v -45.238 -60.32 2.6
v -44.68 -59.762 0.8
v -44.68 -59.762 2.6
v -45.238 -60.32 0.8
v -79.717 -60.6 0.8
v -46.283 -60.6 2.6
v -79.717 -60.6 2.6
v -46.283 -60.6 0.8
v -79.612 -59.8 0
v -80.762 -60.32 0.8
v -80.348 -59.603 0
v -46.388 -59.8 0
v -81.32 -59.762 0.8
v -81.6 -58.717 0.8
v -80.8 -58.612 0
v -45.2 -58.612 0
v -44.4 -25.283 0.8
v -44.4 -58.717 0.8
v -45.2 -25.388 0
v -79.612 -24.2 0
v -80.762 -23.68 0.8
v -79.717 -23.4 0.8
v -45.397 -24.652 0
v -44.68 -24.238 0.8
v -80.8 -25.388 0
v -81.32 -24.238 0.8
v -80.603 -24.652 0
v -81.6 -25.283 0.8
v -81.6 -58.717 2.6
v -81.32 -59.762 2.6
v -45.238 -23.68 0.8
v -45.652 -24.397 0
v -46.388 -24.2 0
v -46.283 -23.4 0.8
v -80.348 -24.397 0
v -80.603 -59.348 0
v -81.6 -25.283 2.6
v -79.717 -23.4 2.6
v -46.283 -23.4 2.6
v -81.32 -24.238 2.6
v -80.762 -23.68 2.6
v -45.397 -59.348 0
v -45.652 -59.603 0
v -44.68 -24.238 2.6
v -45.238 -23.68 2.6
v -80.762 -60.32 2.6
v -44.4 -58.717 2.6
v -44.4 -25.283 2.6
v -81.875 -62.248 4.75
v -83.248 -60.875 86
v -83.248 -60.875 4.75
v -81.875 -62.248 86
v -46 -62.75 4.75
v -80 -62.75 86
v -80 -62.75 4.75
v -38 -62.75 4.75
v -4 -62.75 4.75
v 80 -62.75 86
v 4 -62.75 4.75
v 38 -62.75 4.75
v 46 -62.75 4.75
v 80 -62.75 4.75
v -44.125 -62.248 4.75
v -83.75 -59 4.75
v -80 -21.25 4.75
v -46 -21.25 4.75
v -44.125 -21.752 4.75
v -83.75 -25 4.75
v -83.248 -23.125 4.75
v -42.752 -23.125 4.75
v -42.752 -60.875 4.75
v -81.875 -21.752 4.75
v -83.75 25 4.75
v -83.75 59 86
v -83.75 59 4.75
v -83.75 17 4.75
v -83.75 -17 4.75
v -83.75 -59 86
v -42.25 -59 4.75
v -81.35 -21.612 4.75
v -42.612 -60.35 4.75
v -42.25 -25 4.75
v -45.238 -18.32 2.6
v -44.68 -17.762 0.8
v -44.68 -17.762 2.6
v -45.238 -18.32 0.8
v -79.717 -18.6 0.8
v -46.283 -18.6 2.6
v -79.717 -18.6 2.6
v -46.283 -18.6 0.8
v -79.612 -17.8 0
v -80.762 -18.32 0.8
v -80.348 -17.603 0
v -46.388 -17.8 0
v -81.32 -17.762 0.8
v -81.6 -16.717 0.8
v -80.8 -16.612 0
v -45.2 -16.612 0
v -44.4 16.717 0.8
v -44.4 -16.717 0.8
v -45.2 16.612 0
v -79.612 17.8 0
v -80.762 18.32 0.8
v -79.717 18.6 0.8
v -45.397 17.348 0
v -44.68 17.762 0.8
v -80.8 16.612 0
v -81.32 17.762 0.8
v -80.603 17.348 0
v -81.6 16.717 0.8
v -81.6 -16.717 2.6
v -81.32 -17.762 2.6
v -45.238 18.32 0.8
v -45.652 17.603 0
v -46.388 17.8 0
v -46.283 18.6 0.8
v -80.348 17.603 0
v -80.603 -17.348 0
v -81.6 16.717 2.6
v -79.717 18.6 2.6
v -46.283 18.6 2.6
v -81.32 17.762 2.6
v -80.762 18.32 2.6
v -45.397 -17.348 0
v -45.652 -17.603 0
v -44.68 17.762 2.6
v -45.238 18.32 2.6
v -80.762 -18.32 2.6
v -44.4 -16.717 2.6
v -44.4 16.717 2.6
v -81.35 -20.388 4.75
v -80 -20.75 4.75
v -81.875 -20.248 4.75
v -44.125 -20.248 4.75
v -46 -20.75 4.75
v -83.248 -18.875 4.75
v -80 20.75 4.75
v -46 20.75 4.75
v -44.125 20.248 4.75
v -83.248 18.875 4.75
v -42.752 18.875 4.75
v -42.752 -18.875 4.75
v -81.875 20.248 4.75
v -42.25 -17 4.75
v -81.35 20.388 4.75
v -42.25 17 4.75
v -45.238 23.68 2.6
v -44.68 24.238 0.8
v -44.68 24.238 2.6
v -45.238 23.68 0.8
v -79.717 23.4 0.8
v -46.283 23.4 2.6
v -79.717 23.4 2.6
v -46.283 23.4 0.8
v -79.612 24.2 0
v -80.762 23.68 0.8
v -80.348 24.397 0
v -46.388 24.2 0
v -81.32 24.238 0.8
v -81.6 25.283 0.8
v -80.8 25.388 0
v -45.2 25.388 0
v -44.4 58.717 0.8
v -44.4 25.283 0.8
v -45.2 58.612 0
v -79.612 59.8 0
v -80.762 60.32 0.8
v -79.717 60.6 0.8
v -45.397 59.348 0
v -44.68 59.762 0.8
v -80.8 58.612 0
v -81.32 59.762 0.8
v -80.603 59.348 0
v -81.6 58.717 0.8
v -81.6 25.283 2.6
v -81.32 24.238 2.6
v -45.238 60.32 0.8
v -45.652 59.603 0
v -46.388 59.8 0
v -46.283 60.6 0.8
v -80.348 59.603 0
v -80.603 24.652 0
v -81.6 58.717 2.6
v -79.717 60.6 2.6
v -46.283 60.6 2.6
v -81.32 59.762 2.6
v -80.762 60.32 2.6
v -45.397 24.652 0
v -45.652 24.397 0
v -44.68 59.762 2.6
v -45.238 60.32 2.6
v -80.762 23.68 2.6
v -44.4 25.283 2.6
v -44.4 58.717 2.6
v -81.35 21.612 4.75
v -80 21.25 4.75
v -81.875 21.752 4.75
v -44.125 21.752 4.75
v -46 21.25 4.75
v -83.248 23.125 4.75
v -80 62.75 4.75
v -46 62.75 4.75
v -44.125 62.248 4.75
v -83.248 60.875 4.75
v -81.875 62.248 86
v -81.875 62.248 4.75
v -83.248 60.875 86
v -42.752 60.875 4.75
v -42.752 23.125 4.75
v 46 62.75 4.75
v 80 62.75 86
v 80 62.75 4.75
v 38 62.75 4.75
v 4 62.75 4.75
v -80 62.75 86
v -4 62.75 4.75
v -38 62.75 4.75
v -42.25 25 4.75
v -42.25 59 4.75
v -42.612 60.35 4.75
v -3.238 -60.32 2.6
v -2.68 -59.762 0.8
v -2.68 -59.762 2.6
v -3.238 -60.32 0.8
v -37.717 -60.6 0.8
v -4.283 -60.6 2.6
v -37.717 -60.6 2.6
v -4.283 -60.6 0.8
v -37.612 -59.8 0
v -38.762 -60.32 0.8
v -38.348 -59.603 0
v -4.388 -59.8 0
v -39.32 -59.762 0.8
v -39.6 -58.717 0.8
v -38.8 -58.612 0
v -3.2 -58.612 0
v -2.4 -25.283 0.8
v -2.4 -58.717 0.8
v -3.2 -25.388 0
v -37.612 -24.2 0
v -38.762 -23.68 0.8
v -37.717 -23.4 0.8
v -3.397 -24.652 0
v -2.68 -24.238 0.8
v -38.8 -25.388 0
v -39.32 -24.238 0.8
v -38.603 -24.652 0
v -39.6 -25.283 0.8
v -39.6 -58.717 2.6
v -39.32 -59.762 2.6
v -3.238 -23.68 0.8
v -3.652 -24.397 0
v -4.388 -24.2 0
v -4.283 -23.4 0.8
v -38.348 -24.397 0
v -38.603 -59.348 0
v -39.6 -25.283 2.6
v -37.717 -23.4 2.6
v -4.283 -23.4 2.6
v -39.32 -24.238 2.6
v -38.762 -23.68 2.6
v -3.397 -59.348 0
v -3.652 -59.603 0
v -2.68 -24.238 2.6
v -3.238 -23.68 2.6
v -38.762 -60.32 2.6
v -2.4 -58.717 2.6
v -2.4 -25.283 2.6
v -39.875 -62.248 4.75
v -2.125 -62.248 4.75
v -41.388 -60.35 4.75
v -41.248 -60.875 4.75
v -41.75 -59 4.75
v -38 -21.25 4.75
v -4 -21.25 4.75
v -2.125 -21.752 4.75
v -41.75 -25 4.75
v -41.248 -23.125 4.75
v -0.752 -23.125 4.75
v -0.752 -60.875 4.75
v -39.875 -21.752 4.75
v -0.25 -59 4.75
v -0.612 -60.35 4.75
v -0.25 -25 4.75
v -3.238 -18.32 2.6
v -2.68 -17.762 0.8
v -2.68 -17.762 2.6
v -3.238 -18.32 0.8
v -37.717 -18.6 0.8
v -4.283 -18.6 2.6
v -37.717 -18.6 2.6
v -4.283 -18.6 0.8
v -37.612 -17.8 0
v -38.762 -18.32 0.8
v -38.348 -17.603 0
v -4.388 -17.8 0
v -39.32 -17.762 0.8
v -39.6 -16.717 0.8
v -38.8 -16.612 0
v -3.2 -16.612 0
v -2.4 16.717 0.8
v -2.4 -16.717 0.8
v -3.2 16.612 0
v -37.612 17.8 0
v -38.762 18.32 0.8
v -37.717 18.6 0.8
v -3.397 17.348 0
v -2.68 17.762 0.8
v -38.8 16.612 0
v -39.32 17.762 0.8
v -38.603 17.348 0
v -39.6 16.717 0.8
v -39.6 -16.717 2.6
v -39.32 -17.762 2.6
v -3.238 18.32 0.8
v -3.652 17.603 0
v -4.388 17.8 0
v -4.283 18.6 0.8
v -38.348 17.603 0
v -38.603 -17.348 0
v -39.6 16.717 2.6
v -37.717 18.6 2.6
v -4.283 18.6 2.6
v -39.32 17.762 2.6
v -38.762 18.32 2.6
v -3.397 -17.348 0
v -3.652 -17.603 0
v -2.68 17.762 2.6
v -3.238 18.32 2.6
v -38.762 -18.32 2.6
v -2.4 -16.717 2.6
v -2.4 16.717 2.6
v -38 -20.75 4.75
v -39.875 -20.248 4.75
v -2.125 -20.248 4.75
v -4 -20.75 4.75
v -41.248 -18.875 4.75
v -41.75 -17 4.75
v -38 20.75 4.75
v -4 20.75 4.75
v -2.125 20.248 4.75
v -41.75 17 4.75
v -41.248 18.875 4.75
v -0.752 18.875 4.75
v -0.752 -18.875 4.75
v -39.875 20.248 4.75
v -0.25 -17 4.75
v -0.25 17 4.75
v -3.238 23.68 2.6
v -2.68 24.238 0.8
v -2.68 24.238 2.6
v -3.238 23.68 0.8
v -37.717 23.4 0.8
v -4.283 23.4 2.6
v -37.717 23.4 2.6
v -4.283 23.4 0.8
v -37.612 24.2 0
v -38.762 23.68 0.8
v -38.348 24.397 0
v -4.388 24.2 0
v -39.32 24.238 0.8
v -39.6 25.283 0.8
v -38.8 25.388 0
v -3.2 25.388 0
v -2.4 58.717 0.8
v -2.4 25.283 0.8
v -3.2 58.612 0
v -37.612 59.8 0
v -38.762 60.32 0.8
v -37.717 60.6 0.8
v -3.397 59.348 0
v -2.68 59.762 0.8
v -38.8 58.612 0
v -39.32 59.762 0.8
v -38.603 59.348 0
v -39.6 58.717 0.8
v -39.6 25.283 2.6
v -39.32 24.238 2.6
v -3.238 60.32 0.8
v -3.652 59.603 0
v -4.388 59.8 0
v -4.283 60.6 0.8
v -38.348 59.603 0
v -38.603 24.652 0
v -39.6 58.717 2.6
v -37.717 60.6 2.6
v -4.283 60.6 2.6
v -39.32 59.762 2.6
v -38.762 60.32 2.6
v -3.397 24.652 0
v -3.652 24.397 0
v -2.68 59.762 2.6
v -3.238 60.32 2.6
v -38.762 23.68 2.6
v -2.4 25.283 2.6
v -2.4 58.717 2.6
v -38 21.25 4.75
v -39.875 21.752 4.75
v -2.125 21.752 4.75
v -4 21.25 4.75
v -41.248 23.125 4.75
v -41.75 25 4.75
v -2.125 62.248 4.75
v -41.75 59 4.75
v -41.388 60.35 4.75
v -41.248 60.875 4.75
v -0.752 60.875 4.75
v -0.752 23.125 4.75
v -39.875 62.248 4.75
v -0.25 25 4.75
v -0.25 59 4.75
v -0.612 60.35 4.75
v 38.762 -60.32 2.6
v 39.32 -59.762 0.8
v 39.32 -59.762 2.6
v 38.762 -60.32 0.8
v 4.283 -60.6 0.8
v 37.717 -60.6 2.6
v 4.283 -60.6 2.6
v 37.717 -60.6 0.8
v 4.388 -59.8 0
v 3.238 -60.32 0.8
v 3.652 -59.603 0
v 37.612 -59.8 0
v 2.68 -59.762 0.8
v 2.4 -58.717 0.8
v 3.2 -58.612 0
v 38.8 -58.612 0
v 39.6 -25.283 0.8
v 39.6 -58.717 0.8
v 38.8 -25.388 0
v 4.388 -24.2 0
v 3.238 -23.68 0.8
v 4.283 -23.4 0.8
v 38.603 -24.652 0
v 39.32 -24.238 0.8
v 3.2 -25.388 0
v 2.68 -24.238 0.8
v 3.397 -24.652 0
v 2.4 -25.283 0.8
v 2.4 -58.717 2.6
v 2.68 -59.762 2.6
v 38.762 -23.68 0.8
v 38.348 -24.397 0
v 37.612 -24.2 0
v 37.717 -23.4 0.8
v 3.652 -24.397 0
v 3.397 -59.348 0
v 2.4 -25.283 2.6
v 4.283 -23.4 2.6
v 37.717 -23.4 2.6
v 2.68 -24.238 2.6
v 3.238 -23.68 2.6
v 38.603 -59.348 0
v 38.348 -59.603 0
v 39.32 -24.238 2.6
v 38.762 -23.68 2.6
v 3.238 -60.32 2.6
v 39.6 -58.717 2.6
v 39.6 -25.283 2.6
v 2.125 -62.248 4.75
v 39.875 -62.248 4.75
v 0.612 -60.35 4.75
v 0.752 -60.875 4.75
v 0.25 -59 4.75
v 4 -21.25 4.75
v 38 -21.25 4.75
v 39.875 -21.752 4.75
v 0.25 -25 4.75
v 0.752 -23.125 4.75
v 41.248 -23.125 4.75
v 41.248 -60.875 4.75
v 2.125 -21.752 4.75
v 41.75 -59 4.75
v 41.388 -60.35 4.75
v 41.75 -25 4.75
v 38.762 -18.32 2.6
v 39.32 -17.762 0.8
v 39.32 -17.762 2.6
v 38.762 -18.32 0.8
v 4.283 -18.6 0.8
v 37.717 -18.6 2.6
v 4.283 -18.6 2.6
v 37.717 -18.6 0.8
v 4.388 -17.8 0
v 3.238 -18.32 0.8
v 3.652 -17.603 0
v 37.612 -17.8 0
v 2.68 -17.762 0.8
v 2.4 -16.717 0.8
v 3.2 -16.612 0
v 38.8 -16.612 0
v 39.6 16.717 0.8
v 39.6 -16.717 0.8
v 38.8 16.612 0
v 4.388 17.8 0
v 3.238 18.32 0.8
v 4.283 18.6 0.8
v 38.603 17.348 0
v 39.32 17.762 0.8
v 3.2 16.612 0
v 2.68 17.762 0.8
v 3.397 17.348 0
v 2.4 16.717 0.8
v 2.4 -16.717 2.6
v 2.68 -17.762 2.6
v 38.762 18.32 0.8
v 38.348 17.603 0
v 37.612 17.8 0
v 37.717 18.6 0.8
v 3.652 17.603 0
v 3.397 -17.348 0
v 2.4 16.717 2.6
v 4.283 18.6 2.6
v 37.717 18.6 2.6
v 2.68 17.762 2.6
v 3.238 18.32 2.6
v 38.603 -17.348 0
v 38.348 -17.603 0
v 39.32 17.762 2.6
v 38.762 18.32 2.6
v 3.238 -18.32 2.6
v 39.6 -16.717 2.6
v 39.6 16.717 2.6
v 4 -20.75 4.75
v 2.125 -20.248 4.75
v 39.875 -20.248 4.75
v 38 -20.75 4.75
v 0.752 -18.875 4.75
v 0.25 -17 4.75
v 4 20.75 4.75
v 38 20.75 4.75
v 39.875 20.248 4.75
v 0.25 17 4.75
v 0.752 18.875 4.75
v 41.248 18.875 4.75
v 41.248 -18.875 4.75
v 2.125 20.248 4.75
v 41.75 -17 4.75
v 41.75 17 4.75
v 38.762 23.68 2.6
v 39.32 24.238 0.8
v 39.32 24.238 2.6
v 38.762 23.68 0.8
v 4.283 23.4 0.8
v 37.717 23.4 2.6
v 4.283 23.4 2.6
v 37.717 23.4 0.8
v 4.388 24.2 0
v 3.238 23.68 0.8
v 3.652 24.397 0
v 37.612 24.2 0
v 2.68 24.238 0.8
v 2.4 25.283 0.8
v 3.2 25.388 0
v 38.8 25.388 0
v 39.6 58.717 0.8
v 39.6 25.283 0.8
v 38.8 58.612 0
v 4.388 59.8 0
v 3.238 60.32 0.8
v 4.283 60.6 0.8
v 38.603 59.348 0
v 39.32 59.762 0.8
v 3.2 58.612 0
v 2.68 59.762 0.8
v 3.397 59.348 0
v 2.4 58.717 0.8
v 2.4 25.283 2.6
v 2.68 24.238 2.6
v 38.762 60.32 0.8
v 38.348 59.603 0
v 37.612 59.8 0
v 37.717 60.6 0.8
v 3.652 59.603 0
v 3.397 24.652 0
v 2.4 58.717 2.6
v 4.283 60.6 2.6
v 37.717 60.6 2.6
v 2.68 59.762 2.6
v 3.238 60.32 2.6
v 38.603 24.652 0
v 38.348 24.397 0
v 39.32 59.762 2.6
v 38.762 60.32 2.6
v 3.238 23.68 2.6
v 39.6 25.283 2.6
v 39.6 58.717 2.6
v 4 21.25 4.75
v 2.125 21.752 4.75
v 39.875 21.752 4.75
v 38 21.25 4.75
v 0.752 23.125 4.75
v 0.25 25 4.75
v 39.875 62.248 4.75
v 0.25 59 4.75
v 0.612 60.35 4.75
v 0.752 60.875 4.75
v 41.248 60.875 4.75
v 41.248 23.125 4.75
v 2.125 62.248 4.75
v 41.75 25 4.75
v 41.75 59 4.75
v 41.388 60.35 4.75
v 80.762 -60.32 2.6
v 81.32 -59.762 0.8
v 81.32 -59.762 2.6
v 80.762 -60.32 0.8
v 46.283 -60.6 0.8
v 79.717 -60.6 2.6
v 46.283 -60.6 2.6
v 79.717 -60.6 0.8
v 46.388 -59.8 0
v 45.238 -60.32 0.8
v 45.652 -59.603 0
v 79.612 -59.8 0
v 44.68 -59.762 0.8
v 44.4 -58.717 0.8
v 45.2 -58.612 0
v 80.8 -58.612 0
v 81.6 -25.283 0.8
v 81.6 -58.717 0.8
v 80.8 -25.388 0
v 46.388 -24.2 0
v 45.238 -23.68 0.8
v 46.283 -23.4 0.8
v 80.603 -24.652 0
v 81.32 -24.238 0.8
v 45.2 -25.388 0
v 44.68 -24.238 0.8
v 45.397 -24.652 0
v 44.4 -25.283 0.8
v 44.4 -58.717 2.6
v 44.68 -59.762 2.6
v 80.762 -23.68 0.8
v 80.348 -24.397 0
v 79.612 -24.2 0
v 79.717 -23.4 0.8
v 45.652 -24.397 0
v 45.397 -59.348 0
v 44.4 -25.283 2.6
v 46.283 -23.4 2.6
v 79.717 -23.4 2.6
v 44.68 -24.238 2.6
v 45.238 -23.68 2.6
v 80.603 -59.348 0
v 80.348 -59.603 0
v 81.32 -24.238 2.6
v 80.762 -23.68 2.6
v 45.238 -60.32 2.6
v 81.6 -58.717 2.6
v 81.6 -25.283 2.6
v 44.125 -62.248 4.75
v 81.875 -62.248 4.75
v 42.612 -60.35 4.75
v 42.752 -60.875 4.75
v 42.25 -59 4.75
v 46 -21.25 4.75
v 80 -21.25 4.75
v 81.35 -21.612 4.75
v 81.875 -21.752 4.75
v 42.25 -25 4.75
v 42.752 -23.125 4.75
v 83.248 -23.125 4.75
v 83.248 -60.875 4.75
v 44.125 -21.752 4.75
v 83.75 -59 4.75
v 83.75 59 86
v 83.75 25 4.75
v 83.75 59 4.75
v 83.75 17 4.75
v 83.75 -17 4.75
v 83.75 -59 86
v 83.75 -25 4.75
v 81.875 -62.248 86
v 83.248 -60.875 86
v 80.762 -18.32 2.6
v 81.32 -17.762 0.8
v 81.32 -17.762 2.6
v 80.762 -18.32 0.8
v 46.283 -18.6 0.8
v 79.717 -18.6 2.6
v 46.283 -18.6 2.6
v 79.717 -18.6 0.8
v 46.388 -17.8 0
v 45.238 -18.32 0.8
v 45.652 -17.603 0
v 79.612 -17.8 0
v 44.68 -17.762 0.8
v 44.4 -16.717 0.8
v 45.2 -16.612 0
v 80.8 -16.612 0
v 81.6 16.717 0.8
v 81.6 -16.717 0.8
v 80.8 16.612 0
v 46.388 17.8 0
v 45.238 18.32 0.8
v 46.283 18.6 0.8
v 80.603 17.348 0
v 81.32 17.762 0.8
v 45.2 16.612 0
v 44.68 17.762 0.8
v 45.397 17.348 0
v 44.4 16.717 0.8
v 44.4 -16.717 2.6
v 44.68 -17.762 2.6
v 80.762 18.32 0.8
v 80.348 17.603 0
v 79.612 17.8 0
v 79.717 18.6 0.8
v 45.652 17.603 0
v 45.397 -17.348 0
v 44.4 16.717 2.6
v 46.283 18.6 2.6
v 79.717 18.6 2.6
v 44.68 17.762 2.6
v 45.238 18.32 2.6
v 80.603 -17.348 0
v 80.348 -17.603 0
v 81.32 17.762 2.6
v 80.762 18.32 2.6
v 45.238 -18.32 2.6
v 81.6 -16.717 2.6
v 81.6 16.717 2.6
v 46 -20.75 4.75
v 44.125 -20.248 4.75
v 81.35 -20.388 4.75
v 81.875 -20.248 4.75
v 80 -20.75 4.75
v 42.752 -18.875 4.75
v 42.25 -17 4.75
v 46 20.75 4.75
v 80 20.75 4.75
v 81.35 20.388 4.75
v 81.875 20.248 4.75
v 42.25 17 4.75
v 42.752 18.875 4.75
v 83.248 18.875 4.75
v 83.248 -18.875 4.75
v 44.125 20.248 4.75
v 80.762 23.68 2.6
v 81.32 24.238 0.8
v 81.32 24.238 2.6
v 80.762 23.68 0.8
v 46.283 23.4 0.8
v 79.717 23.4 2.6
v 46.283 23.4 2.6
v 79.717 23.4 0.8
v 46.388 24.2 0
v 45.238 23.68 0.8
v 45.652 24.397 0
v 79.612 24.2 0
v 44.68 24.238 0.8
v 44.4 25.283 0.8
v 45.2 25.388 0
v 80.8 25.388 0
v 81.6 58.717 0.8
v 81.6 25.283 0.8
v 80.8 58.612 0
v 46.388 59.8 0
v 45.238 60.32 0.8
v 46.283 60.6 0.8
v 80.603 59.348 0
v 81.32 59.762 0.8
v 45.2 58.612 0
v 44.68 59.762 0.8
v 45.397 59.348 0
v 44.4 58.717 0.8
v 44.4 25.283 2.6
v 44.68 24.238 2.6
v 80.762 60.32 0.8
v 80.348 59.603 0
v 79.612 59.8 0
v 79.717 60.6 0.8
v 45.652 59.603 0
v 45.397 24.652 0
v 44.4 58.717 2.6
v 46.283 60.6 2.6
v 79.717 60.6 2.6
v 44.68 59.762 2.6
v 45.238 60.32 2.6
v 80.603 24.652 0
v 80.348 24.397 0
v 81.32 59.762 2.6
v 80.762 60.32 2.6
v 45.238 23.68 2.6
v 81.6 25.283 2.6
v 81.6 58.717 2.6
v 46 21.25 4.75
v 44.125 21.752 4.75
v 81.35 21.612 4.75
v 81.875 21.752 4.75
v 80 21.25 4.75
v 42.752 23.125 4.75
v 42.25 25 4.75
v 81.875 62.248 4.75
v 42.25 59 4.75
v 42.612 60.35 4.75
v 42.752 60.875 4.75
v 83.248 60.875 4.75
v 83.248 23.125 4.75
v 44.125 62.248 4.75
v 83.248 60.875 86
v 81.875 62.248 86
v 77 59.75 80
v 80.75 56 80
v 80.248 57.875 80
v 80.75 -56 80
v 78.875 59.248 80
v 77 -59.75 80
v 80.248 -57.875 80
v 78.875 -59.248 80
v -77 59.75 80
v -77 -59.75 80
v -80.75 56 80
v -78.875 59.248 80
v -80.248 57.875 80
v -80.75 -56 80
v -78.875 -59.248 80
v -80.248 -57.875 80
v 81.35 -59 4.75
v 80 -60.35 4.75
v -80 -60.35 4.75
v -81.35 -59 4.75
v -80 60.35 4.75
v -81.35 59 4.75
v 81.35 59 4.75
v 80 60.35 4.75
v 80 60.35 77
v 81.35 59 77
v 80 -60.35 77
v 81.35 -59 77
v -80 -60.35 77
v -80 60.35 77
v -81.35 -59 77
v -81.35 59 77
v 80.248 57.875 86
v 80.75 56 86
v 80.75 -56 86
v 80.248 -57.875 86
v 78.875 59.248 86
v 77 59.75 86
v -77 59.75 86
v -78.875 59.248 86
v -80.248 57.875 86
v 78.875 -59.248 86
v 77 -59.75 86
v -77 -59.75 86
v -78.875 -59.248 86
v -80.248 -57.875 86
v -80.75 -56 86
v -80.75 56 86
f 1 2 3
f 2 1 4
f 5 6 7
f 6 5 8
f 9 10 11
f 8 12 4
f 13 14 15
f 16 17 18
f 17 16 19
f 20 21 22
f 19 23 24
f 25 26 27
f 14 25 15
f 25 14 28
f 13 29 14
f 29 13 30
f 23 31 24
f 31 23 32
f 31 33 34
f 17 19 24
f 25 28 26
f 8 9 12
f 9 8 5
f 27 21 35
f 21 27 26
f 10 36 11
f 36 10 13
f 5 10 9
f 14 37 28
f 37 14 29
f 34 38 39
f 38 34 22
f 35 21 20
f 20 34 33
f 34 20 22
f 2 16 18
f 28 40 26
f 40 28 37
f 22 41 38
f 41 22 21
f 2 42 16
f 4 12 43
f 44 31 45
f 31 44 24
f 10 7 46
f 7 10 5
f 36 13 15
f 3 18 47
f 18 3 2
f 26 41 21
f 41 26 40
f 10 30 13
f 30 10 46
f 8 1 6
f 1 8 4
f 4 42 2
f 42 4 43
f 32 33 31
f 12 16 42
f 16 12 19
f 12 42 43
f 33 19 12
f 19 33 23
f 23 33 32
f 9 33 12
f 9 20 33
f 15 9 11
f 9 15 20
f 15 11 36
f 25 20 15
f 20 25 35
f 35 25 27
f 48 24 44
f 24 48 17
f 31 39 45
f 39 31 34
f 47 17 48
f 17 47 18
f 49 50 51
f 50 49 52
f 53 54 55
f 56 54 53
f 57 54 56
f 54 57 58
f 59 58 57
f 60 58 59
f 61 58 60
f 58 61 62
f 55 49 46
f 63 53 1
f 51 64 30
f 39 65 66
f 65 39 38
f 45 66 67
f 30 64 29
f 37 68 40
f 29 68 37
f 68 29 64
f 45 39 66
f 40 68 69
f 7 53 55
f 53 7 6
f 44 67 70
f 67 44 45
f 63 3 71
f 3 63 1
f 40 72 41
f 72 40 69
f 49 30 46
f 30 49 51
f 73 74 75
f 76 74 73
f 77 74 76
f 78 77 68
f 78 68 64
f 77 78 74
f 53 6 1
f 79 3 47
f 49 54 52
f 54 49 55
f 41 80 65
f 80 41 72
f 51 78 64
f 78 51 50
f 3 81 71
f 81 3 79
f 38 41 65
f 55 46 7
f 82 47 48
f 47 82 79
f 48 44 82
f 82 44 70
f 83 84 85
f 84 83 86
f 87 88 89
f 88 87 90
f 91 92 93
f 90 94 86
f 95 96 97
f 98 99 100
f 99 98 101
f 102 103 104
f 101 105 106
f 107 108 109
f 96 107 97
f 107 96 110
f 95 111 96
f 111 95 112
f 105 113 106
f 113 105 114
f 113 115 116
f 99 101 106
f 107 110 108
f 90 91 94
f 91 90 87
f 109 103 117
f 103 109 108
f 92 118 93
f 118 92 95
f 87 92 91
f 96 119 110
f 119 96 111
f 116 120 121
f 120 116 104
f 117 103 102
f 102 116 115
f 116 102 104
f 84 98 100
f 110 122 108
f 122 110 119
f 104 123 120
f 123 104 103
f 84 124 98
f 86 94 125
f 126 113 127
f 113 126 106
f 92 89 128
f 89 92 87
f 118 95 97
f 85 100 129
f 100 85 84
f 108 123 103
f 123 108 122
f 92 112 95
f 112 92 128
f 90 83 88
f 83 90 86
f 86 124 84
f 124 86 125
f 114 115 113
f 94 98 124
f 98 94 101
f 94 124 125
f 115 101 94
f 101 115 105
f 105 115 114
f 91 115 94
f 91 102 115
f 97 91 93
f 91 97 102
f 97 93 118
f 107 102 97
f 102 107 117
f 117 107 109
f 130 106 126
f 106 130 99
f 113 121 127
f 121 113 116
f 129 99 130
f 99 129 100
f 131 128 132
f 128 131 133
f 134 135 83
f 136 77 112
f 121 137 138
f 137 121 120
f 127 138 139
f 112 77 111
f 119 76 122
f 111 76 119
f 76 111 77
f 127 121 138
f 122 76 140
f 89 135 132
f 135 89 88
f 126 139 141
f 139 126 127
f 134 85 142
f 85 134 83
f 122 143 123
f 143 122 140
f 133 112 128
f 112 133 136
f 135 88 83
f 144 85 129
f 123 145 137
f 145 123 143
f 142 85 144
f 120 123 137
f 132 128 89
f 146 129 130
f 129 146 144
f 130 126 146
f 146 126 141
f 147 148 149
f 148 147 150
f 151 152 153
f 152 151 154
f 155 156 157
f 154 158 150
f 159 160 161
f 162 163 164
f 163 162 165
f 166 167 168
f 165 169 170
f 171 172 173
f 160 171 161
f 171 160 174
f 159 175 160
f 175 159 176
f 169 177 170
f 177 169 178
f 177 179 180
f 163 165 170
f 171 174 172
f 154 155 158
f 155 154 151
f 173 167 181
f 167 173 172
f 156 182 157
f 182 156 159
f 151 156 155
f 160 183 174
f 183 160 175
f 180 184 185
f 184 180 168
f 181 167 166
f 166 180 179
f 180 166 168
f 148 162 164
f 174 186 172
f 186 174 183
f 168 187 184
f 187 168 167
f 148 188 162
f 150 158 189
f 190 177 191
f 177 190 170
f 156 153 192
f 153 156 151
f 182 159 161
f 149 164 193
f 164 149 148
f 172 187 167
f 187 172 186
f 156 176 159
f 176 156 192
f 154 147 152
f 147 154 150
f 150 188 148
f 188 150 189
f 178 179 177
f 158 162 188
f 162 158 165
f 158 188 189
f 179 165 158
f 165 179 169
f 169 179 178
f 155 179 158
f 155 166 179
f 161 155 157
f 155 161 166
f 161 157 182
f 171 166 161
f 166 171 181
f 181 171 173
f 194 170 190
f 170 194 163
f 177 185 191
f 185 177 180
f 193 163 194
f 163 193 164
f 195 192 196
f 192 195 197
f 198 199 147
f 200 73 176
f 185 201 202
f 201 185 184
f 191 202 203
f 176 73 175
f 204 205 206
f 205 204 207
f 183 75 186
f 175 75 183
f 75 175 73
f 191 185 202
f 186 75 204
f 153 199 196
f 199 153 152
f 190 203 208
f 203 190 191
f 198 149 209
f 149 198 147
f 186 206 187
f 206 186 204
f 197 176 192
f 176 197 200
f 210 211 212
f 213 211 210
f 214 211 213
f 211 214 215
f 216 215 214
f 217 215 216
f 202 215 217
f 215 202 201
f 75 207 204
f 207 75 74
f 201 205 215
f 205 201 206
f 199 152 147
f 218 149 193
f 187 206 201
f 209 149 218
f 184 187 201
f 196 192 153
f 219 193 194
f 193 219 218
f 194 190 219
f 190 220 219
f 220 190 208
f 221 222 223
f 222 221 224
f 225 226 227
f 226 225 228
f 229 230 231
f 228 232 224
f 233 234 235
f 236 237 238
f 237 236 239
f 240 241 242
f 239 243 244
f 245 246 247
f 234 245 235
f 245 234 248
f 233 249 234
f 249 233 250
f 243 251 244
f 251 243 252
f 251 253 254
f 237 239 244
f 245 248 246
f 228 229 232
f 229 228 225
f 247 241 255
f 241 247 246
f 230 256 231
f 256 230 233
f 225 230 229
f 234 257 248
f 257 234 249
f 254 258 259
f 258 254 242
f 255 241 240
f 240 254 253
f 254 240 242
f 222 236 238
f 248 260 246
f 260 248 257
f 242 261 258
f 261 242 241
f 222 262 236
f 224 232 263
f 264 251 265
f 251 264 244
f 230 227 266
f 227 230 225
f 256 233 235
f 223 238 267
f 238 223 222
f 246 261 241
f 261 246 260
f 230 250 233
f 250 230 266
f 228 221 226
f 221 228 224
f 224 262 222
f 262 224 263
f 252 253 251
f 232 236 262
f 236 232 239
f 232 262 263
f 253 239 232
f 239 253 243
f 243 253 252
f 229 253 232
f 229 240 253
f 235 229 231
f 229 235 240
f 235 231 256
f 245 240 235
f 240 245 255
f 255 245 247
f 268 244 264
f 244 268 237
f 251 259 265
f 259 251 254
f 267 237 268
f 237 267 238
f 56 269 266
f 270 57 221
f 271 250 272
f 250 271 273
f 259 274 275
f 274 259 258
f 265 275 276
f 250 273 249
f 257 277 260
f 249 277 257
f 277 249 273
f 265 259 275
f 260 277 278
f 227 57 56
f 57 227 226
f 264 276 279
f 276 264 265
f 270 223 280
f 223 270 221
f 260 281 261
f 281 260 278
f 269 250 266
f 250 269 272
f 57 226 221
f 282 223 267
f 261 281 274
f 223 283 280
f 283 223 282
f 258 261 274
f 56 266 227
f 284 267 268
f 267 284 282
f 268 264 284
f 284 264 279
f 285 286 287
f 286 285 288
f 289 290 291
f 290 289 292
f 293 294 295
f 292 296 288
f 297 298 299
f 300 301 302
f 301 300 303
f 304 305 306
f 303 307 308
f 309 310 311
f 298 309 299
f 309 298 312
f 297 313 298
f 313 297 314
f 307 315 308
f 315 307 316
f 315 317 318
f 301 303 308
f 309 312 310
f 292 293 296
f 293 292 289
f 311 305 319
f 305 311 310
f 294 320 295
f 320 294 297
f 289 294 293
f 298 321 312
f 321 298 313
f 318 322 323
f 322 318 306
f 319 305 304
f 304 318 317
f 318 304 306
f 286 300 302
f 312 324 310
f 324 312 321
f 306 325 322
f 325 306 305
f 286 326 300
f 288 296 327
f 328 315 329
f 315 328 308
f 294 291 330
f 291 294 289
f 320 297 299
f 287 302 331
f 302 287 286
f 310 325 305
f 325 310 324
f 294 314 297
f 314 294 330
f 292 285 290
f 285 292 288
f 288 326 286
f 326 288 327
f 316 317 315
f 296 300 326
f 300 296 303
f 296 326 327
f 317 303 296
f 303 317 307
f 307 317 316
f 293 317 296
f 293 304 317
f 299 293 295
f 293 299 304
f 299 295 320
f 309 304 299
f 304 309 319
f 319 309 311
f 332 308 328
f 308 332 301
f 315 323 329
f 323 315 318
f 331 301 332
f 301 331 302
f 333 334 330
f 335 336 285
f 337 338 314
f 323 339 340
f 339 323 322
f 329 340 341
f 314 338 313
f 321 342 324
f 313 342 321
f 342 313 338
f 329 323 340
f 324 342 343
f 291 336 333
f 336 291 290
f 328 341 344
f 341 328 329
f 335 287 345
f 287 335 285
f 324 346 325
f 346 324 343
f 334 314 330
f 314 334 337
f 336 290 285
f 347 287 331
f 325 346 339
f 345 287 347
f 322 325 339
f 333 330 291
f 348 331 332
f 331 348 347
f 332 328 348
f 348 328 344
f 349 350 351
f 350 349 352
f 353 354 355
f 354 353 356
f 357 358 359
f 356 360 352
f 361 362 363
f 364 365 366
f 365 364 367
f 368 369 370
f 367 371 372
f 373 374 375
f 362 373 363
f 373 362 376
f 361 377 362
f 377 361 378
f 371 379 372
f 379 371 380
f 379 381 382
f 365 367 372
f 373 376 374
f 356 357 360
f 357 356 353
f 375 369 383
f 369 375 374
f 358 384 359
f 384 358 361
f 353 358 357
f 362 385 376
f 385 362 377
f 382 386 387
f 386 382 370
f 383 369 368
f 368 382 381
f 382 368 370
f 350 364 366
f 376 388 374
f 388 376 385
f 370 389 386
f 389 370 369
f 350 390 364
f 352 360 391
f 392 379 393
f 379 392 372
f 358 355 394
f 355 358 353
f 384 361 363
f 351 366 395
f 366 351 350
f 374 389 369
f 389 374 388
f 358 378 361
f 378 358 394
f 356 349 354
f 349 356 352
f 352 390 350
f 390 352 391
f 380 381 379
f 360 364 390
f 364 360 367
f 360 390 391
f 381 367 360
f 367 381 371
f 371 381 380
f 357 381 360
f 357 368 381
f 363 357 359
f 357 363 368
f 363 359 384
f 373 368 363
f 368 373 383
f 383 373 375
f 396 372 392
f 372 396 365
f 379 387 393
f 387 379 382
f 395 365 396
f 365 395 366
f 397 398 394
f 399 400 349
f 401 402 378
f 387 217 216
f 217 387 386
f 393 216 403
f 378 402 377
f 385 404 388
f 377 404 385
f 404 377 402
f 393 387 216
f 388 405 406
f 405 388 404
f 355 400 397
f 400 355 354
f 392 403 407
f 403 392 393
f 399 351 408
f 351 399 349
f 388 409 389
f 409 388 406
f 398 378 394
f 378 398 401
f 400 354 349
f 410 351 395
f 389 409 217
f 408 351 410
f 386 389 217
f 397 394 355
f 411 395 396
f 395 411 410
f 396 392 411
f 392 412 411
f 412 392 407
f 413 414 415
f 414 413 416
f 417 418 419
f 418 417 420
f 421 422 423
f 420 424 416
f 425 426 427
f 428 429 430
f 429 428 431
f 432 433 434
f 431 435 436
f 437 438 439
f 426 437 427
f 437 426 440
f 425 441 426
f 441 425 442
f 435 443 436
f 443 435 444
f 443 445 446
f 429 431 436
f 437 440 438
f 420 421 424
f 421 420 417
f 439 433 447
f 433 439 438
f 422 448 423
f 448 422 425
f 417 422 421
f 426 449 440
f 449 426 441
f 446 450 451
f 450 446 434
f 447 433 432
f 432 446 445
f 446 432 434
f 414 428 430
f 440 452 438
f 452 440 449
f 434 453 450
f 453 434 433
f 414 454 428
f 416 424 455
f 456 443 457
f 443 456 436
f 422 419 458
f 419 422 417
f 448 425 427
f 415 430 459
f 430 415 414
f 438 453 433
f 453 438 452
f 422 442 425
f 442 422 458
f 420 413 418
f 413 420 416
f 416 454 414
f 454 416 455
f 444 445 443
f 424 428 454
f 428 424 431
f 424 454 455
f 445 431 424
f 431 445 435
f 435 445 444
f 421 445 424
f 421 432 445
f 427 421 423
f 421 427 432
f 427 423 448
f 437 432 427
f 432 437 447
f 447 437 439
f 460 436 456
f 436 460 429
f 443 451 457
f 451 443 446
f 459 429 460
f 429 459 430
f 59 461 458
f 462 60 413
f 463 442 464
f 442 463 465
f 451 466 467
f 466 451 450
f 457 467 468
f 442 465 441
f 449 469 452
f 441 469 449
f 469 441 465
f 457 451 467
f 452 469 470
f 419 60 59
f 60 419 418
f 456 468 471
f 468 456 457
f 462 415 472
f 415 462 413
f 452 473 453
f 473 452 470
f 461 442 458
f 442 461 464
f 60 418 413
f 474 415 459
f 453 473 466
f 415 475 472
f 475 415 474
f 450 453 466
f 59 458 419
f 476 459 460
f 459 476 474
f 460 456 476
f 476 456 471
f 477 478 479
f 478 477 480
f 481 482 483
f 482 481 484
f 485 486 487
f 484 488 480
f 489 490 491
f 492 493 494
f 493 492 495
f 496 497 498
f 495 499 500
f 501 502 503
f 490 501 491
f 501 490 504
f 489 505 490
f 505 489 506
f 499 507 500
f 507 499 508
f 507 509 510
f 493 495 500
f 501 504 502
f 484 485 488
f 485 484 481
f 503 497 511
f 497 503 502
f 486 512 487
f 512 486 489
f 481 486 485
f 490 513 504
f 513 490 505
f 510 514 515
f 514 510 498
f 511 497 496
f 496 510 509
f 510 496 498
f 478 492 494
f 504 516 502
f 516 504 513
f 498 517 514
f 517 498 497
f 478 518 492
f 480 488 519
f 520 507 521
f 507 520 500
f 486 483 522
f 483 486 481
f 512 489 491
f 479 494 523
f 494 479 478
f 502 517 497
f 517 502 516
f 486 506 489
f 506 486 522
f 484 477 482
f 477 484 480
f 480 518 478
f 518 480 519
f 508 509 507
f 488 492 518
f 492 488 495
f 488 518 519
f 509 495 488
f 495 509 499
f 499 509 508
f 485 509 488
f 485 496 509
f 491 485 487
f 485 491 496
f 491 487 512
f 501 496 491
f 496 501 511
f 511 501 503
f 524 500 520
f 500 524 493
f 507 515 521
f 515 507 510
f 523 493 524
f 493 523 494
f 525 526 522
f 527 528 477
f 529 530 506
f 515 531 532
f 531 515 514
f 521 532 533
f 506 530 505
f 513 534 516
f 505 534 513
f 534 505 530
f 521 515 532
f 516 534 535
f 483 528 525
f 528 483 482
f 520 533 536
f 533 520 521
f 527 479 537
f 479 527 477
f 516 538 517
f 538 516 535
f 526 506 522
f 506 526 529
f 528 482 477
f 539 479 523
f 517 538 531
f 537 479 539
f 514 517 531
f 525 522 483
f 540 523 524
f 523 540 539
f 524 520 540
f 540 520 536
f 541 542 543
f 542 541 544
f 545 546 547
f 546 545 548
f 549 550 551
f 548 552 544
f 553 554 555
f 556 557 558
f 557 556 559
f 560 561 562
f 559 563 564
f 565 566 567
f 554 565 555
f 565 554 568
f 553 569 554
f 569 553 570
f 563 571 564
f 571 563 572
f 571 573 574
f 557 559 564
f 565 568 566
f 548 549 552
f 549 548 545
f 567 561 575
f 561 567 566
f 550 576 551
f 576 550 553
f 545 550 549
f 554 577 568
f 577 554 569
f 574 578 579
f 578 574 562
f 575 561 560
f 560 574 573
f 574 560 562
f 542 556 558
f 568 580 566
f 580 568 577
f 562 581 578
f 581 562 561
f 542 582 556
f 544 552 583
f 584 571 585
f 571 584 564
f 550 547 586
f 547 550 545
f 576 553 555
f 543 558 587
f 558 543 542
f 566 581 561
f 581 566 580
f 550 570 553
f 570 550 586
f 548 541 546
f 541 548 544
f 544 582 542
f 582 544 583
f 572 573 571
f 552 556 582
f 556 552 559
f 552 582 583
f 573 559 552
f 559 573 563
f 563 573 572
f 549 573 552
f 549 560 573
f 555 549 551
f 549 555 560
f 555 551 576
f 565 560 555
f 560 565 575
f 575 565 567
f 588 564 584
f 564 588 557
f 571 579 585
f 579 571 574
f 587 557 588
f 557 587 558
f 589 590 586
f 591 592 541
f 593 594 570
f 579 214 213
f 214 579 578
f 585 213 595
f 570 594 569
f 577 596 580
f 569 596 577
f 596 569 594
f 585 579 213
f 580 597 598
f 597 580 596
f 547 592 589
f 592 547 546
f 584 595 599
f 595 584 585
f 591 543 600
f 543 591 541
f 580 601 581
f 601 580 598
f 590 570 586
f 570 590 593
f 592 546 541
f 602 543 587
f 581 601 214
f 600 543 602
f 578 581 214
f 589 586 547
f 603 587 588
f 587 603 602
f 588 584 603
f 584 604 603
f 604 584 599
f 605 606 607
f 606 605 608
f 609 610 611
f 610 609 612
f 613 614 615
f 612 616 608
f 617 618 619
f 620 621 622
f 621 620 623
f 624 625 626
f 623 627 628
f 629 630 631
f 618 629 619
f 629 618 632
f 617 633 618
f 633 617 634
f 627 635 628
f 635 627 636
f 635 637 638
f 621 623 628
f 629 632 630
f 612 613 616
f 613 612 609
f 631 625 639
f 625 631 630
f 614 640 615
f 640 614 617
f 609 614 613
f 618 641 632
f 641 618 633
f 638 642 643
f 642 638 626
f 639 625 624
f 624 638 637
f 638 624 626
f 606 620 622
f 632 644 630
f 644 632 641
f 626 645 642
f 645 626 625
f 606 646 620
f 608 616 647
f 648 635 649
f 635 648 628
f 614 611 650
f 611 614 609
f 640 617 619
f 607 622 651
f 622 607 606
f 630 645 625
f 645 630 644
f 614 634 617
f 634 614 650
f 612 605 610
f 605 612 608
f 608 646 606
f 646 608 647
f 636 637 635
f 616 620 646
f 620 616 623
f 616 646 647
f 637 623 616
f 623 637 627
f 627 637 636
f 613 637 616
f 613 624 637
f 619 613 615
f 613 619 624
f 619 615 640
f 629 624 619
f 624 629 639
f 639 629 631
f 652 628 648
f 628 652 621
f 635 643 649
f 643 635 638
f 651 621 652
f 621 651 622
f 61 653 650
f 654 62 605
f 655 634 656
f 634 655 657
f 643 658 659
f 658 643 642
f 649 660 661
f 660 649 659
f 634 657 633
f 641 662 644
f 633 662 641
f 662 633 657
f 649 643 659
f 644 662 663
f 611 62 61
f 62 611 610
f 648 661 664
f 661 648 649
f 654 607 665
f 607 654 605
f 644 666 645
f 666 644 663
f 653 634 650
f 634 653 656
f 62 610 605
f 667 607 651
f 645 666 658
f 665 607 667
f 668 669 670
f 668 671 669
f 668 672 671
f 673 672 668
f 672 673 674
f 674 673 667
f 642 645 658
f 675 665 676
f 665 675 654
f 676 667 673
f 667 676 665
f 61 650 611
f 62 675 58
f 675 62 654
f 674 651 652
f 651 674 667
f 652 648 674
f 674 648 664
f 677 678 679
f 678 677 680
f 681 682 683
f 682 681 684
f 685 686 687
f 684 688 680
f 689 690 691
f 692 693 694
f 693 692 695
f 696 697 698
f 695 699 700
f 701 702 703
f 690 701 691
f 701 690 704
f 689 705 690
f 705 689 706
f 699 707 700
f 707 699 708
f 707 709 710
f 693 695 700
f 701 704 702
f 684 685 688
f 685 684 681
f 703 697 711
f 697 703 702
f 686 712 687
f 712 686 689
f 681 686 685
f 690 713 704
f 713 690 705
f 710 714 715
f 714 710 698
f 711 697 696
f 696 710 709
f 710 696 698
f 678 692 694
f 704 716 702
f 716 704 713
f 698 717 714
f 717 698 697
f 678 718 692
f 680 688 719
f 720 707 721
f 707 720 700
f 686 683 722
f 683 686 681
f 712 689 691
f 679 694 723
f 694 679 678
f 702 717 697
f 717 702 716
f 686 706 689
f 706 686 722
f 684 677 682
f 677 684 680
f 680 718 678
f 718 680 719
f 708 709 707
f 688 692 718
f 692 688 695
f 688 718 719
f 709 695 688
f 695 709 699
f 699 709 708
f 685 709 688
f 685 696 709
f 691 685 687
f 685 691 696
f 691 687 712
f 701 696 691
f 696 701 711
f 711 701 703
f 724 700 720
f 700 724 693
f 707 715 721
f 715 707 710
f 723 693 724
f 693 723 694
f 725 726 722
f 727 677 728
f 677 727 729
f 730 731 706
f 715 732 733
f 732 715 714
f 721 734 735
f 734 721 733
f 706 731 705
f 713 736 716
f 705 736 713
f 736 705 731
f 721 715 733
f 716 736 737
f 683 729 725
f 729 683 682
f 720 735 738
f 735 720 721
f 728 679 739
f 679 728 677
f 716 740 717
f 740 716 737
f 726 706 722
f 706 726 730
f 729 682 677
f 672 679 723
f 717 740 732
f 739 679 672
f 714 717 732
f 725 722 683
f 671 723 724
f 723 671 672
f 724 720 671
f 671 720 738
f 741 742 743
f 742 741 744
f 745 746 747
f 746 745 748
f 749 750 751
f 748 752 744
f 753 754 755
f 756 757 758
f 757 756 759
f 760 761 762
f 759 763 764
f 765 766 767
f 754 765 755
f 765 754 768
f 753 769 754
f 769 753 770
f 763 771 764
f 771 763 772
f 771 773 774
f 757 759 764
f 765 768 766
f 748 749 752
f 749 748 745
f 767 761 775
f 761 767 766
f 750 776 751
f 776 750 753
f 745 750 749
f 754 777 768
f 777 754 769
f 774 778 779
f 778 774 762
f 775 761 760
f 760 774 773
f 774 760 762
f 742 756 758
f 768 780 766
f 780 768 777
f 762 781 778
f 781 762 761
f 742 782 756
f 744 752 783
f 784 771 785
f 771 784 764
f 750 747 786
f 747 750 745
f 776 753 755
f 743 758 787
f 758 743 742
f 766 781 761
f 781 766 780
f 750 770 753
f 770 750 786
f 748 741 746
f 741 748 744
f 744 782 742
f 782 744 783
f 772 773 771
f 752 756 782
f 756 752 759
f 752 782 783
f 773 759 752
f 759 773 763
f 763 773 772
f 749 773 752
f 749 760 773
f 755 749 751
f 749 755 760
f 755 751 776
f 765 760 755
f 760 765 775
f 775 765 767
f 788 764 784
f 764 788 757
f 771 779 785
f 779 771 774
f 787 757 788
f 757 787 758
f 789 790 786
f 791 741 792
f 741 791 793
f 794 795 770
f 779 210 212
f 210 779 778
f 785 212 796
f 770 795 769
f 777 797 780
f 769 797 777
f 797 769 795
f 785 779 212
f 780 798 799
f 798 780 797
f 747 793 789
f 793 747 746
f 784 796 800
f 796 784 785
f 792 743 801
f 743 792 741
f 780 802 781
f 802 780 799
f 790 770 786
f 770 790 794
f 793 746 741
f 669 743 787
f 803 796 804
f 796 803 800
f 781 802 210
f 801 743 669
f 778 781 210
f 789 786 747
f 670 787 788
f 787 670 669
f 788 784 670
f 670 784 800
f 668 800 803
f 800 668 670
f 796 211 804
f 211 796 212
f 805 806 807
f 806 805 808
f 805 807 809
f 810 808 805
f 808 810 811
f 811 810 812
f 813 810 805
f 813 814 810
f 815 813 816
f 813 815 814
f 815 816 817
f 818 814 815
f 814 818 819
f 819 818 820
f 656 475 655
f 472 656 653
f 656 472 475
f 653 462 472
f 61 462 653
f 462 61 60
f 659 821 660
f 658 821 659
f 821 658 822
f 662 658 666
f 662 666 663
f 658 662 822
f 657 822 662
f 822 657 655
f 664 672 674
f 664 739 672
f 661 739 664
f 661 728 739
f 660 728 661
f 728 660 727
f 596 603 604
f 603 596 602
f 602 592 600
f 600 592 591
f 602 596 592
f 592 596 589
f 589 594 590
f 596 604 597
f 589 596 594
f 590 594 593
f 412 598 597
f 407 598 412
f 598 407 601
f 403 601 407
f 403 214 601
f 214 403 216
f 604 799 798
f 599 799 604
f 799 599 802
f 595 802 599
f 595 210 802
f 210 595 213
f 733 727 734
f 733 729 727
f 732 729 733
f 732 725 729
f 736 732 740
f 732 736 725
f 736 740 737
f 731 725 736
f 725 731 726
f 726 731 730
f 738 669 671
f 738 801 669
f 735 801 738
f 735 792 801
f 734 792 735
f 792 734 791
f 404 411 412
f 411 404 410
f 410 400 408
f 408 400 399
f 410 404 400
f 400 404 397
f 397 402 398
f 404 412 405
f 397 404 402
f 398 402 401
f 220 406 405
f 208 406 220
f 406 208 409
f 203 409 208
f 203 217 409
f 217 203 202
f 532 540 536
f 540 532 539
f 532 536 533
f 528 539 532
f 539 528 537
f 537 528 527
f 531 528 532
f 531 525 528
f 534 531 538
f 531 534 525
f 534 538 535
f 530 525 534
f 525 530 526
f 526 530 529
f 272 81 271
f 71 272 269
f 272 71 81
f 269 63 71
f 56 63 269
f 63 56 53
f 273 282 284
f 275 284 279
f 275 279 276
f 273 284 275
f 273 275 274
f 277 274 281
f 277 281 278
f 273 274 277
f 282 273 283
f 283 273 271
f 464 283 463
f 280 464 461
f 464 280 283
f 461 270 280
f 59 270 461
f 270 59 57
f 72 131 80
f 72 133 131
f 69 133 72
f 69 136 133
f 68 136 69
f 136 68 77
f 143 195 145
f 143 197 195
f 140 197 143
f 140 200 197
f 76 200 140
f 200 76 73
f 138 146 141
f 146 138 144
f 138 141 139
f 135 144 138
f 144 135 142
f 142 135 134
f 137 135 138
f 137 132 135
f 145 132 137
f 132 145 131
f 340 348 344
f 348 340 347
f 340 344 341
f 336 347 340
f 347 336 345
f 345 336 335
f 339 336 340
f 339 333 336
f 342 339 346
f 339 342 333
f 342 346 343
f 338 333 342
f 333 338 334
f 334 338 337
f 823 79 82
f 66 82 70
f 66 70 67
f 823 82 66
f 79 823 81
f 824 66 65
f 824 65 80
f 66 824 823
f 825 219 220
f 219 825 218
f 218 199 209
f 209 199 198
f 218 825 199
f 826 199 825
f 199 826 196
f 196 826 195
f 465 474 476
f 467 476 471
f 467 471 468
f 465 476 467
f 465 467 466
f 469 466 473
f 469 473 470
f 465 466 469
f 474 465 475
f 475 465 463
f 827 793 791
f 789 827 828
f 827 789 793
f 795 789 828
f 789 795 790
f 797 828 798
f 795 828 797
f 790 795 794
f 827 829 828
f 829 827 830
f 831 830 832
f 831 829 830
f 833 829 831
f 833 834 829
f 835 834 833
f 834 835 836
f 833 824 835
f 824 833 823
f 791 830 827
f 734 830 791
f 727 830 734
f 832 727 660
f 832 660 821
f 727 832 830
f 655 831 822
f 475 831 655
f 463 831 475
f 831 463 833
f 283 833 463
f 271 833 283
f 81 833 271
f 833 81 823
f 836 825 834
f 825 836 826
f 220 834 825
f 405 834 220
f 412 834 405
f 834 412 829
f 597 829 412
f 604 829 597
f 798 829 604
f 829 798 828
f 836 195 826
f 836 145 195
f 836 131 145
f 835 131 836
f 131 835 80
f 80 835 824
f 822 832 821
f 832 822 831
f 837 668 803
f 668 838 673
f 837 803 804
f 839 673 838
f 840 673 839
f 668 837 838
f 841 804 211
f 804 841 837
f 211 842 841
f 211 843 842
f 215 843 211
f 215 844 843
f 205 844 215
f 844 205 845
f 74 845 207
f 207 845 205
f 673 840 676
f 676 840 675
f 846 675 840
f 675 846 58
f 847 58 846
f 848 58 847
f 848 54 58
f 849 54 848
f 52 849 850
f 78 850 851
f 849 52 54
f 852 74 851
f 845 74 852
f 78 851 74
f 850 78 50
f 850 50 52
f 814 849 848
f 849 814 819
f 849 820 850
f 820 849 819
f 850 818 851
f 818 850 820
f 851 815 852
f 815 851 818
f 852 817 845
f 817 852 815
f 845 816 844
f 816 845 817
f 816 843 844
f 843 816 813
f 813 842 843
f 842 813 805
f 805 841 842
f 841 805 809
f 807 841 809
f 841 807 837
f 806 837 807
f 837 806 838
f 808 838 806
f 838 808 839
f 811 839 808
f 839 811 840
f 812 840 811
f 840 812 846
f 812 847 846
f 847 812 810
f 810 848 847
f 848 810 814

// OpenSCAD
// file: ../lib/gridfinity.scad
// SPDX-License-Identifier: MIT
// Copyright (c) 2026 Aaron Cupp
//
// gridfinity.scad — shared Gridfinity baseplate + bin library (per spec).
//
// 42 mm pitch, 41.5 mm bins, baseplate socket 0.7/1.8/2.15 = 4.65 mm, 4 mm
// fillet; bin foot 0.8/1.8/2.15 = 4.75 mm, 3.75 mm corner radius. Verified the
// bin foot seats in the baseplate socket with ~0.25–0.5 mm clearance.
//
//   baseplate(nx, ny)                      — tiled receiving baseplate
//   bin_blank(nx, ny, h)                   — solid bin body (feet + block, no cavity)
//   bin(nx, ny, h, wall, floor)            — open Gridfinity bin
//   divided_bin(nx, ny, h, cols, rows, …)  — bin with internal compartments
//   lid(nx, ny, …)                         — friction lid for a bin of the same footprint
//   stack_base(nx, ny, h, …)               — baseplate-topped base; a bin socket-stacks on it

GF = 42; GF_FILLET = 4;
_C_TOP = 2.15; _C_MID = 1.8; _C_BOT = 0.7;
_BP_LIP = _C_TOP + _C_MID + _C_BOT; _BP_FLOOR = 1.2; BP_H = _BP_LIP + _BP_FLOOR;  // 5.85
BIN_SZ = 41.5; BIN_R = 3.75; BIN_BASE_H = 4.75;

// ---- baseplate ----
module _bp_cell(i = 0) { offset(r = -i) offset(r = GF_FILLET) offset(r = -GF_FILLET) square(GF, center = true); }
module _bp_socket() {
    e = 0.01;
    hull() { translate([0,0,BP_H-e]) linear_extrude(e) _bp_cell(0); translate([0,0,BP_H-_C_TOP]) linear_extrude(e) _bp_cell(_C_TOP); }
    translate([0,0,BP_H-_C_TOP-_C_MID]) linear_extrude(_C_MID) _bp_cell(_C_TOP);
    hull() { translate([0,0,BP_H-_C_TOP-_C_MID-e]) linear_extrude(e) _bp_cell(_C_TOP); translate([0,0,BP_H-_BP_LIP]) linear_extrude(e) _bp_cell(_C_TOP+_C_BOT); }
}
module baseplate(nx, ny) {
    w = nx*GF; d = ny*GF;
    difference() {
        translate([0,0,BP_H/2]) linear_extrude(BP_H, center=true) offset(GF_FILLET) offset(-GF_FILLET) square([w,d], center=true);
        for (ix=[0:nx-1], iy=[0:ny-1]) translate([(ix-(nx-1)/2)*GF, (iy-(ny-1)/2)*GF, 0]) _bp_socket();
    }
}

// ---- bin ----
module _bin_cell(i = 0) { offset(r = -i) offset(r = BIN_R) offset(r = -BIN_R) square(BIN_SZ, center = true); }
module _bin_foot() {
    e = 0.01;
    hull() { linear_extrude(e) _bin_cell(2.95); translate([0,0,0.8]) linear_extrude(e) _bin_cell(2.15); }    // bottom chamfer
    translate([0,0,0.8]) linear_extrude(1.8) _bin_cell(2.15);                                                 // vertical
    hull() { translate([0,0,2.6]) linear_extrude(e) _bin_cell(2.15); translate([0,0,BIN_BASE_H]) linear_extrude(e) _bin_cell(0); } // top chamfer
}
// Solid bin body: Gridfinity feet + the block above them, with no cavity cut.
// Cup-style bins (lib/vessel.scad) subtract their own bores from this instead of
// re-deriving the foot + shell union.
module bin_blank(nx, ny, h) {
    W = nx*GF - 0.5; D = ny*GF - 0.5;
    union() {
        for (ix=[0:nx-1], iy=[0:ny-1]) translate([(ix-(nx-1)/2)*GF, (iy-(ny-1)/2)*GF, 0]) _bin_foot();
        translate([0,0,BIN_BASE_H]) linear_extrude(h-BIN_BASE_H) offset(BIN_R) offset(-BIN_R) square([W,D], center=true);
    }
}

module _bin_shell(nx, ny, h, wall, floor) {
    W = nx*GF - 0.5; D = ny*GF - 0.5;
    difference() {
        bin_blank(nx, ny, h);
        translate([0,0,BIN_BASE_H+floor]) linear_extrude(h) offset(BIN_R-wall) offset(-(BIN_R-wall)) square([W-2*wall, D-2*wall], center=true);
    }
}
module bin(nx, ny, h, wall = 1.2, floor = 1.4) { _bin_shell(nx, ny, h, wall, floor); }

// ---- stacking base ----
// A bin whose TOP is a Gridfinity baseplate, so a standard bin socket-stacks on
// it (two-tier towers: instrument on top, cords/jig/adapters in the base). The
// base is open at the FRONT (−Y) by default so the lower item is reachable while
// the top tier stays socketed — same idea as drybox-splitter-stand's open cubby.
// The whole tower foots on the bench baseplate via this base's own foot.
//
//   h = interior height of the lower compartment (floor to the baseplate cap).
module stack_base(nx, ny, h, wall = 1.2, floor = 1.4, open_front = true) {
    W = nx*GF - 0.5; D = ny*GF - 0.5;
    z0 = BIN_BASE_H + floor;
    iw = W - 2*wall; id = D - 2*wall;
    difference() {
        union() {
            bin_blank(nx, ny, h);                    // solid foot + block to h
            translate([0,0,h]) baseplate(nx, ny);    // baseplate cap (sockets up)
        }
        // lower cavity, floor up to the cap underside
        translate([0,0,z0]) linear_extrude(h - z0 + 0.01)
            offset(BIN_R-wall) offset(-(BIN_R-wall)) square([iw, id], center=true);
        // open front: cut the −Y wall so you reach in under the cap
        if (open_front)
            translate([-iw/2, -D, z0]) cube([iw, D/2 + 0.01, h - z0 + 0.01]);
    }
}

module divided_bin(nx, ny, h, cols = 1, rows = 1, wall = 1.2, floor = 1.4, div = 1.2) {
    W = nx*GF - 0.5; D = ny*GF - 0.5;
    union() {
        bin(nx, ny, h, wall, floor);
        // internal divider walls (from the floor up to the rim)
        iw = W - 2*wall; id = D - 2*wall; z0 = BIN_BASE_H + floor;
        for (c = [1 : cols-1]) translate([-iw/2 + c*iw/cols - div/2, -id/2, z0]) cube([div, id, h - z0]);
        for (r = [1 : rows-1]) translate([-iw/2, -id/2 + r*id/rows - div/2, z0]) cube([iw, div, h - z0]);
    }
}

// ---- lid ----
// Friction lid for a bin of the same footprint: a flat plate with a skirt that
// drops into the bin's cavity. Emitted PRINT-READY — plate on the bed, skirt
// standing up — so it needs no supports. Flip it in your head to picture it
// fitted: the plate then caps the rim and the lid adds `t` to the stack height.
//
// Why lids exist here: full-extension drawer slides let small parts hop between
// compartments on a hard close, and brass inserts aren't magnetic — you can't
// sweep them back. `wall` must match the bin's wall so the skirt lands in the
// cavity; `clearance` is per-side slop between skirt and cavity.
module lid(nx, ny, t = 1.6, skirt = 4, wall = 1.2, clearance = 0.35, lid_wall = 1.6) {
    W = nx*GF - 0.5; D = ny*GF - 0.5;
    iw = W - 2*wall - 2*clearance; id = D - 2*wall - 2*clearance;   // skirt outer
    ir = BIN_R - wall;                                              // cavity corner radius
    union() {
        linear_extrude(t) offset(BIN_R) offset(-BIN_R) square([W, D], center=true);
        translate([0,0,t]) linear_extrude(skirt) difference() {
            offset(ir) offset(-ir) square([iw, id], center=true);
            offset(ir-lid_wall) offset(-(ir-lid_wall)) square([iw-2*lid_wall, id-2*lid_wall], center=true);
        }
    }
}
// main file
// hot_air_riser — simple Gridfinity-footed riser that lifts the hot-air station
// up behind the front-row gear. Foots into the Clickfinity bench baseplate; the
// station sits on the top deck inside a retaining lip so it can't slide off.
// Hollow body (print economy). Print in PETG — it holds a hot appliance.
//
// TWO NUMBERS to set: the grid footprint (GX × GY, ≥ the station footprint) and
// the height H (deck sits above the front items' height).
include <../lib/gridfinity.scad>

GX = 4;    // ⚠ set: grid cells wide  (× 42 mm). Cover the station footprint.
GY = 3;    // ⚠ set: grid cells deep
H  = 80;   // ⚠ set: riser height, foot → deck top (clear the front items)

WALL   = 2.4;   // body wall
DECK   = 3;     // top deck thickness
LIP_H  = 6;     // retaining lip height
LIP_W  = 3;     // retaining lip width

module hot_air_riser(nx, ny, h) {
    W = nx*GF - 0.5; D = ny*GF - 0.5;
    union() {
        difference() {
            bin_blank(nx, ny, h);                                    // Gridfinity foot + block
            translate([0,0,BIN_BASE_H])                              // hollow from below, leave the deck
                linear_extrude(h - BIN_BASE_H - DECK)
                    offset(BIN_R-WALL) offset(-(BIN_R-WALL))
                        square([W-2*WALL, D-2*WALL], center=true);
        }
        translate([0,0,h]) linear_extrude(LIP_H)                     // top retaining lip
            difference() {
                offset(BIN_R) offset(-BIN_R) square([W, D], center=true);
                offset(BIN_R) offset(-BIN_R) square([W-2*LIP_W, D-2*LIP_W], center=true);
            }
    }
}

hot_air_riser(GX, GY, H);
